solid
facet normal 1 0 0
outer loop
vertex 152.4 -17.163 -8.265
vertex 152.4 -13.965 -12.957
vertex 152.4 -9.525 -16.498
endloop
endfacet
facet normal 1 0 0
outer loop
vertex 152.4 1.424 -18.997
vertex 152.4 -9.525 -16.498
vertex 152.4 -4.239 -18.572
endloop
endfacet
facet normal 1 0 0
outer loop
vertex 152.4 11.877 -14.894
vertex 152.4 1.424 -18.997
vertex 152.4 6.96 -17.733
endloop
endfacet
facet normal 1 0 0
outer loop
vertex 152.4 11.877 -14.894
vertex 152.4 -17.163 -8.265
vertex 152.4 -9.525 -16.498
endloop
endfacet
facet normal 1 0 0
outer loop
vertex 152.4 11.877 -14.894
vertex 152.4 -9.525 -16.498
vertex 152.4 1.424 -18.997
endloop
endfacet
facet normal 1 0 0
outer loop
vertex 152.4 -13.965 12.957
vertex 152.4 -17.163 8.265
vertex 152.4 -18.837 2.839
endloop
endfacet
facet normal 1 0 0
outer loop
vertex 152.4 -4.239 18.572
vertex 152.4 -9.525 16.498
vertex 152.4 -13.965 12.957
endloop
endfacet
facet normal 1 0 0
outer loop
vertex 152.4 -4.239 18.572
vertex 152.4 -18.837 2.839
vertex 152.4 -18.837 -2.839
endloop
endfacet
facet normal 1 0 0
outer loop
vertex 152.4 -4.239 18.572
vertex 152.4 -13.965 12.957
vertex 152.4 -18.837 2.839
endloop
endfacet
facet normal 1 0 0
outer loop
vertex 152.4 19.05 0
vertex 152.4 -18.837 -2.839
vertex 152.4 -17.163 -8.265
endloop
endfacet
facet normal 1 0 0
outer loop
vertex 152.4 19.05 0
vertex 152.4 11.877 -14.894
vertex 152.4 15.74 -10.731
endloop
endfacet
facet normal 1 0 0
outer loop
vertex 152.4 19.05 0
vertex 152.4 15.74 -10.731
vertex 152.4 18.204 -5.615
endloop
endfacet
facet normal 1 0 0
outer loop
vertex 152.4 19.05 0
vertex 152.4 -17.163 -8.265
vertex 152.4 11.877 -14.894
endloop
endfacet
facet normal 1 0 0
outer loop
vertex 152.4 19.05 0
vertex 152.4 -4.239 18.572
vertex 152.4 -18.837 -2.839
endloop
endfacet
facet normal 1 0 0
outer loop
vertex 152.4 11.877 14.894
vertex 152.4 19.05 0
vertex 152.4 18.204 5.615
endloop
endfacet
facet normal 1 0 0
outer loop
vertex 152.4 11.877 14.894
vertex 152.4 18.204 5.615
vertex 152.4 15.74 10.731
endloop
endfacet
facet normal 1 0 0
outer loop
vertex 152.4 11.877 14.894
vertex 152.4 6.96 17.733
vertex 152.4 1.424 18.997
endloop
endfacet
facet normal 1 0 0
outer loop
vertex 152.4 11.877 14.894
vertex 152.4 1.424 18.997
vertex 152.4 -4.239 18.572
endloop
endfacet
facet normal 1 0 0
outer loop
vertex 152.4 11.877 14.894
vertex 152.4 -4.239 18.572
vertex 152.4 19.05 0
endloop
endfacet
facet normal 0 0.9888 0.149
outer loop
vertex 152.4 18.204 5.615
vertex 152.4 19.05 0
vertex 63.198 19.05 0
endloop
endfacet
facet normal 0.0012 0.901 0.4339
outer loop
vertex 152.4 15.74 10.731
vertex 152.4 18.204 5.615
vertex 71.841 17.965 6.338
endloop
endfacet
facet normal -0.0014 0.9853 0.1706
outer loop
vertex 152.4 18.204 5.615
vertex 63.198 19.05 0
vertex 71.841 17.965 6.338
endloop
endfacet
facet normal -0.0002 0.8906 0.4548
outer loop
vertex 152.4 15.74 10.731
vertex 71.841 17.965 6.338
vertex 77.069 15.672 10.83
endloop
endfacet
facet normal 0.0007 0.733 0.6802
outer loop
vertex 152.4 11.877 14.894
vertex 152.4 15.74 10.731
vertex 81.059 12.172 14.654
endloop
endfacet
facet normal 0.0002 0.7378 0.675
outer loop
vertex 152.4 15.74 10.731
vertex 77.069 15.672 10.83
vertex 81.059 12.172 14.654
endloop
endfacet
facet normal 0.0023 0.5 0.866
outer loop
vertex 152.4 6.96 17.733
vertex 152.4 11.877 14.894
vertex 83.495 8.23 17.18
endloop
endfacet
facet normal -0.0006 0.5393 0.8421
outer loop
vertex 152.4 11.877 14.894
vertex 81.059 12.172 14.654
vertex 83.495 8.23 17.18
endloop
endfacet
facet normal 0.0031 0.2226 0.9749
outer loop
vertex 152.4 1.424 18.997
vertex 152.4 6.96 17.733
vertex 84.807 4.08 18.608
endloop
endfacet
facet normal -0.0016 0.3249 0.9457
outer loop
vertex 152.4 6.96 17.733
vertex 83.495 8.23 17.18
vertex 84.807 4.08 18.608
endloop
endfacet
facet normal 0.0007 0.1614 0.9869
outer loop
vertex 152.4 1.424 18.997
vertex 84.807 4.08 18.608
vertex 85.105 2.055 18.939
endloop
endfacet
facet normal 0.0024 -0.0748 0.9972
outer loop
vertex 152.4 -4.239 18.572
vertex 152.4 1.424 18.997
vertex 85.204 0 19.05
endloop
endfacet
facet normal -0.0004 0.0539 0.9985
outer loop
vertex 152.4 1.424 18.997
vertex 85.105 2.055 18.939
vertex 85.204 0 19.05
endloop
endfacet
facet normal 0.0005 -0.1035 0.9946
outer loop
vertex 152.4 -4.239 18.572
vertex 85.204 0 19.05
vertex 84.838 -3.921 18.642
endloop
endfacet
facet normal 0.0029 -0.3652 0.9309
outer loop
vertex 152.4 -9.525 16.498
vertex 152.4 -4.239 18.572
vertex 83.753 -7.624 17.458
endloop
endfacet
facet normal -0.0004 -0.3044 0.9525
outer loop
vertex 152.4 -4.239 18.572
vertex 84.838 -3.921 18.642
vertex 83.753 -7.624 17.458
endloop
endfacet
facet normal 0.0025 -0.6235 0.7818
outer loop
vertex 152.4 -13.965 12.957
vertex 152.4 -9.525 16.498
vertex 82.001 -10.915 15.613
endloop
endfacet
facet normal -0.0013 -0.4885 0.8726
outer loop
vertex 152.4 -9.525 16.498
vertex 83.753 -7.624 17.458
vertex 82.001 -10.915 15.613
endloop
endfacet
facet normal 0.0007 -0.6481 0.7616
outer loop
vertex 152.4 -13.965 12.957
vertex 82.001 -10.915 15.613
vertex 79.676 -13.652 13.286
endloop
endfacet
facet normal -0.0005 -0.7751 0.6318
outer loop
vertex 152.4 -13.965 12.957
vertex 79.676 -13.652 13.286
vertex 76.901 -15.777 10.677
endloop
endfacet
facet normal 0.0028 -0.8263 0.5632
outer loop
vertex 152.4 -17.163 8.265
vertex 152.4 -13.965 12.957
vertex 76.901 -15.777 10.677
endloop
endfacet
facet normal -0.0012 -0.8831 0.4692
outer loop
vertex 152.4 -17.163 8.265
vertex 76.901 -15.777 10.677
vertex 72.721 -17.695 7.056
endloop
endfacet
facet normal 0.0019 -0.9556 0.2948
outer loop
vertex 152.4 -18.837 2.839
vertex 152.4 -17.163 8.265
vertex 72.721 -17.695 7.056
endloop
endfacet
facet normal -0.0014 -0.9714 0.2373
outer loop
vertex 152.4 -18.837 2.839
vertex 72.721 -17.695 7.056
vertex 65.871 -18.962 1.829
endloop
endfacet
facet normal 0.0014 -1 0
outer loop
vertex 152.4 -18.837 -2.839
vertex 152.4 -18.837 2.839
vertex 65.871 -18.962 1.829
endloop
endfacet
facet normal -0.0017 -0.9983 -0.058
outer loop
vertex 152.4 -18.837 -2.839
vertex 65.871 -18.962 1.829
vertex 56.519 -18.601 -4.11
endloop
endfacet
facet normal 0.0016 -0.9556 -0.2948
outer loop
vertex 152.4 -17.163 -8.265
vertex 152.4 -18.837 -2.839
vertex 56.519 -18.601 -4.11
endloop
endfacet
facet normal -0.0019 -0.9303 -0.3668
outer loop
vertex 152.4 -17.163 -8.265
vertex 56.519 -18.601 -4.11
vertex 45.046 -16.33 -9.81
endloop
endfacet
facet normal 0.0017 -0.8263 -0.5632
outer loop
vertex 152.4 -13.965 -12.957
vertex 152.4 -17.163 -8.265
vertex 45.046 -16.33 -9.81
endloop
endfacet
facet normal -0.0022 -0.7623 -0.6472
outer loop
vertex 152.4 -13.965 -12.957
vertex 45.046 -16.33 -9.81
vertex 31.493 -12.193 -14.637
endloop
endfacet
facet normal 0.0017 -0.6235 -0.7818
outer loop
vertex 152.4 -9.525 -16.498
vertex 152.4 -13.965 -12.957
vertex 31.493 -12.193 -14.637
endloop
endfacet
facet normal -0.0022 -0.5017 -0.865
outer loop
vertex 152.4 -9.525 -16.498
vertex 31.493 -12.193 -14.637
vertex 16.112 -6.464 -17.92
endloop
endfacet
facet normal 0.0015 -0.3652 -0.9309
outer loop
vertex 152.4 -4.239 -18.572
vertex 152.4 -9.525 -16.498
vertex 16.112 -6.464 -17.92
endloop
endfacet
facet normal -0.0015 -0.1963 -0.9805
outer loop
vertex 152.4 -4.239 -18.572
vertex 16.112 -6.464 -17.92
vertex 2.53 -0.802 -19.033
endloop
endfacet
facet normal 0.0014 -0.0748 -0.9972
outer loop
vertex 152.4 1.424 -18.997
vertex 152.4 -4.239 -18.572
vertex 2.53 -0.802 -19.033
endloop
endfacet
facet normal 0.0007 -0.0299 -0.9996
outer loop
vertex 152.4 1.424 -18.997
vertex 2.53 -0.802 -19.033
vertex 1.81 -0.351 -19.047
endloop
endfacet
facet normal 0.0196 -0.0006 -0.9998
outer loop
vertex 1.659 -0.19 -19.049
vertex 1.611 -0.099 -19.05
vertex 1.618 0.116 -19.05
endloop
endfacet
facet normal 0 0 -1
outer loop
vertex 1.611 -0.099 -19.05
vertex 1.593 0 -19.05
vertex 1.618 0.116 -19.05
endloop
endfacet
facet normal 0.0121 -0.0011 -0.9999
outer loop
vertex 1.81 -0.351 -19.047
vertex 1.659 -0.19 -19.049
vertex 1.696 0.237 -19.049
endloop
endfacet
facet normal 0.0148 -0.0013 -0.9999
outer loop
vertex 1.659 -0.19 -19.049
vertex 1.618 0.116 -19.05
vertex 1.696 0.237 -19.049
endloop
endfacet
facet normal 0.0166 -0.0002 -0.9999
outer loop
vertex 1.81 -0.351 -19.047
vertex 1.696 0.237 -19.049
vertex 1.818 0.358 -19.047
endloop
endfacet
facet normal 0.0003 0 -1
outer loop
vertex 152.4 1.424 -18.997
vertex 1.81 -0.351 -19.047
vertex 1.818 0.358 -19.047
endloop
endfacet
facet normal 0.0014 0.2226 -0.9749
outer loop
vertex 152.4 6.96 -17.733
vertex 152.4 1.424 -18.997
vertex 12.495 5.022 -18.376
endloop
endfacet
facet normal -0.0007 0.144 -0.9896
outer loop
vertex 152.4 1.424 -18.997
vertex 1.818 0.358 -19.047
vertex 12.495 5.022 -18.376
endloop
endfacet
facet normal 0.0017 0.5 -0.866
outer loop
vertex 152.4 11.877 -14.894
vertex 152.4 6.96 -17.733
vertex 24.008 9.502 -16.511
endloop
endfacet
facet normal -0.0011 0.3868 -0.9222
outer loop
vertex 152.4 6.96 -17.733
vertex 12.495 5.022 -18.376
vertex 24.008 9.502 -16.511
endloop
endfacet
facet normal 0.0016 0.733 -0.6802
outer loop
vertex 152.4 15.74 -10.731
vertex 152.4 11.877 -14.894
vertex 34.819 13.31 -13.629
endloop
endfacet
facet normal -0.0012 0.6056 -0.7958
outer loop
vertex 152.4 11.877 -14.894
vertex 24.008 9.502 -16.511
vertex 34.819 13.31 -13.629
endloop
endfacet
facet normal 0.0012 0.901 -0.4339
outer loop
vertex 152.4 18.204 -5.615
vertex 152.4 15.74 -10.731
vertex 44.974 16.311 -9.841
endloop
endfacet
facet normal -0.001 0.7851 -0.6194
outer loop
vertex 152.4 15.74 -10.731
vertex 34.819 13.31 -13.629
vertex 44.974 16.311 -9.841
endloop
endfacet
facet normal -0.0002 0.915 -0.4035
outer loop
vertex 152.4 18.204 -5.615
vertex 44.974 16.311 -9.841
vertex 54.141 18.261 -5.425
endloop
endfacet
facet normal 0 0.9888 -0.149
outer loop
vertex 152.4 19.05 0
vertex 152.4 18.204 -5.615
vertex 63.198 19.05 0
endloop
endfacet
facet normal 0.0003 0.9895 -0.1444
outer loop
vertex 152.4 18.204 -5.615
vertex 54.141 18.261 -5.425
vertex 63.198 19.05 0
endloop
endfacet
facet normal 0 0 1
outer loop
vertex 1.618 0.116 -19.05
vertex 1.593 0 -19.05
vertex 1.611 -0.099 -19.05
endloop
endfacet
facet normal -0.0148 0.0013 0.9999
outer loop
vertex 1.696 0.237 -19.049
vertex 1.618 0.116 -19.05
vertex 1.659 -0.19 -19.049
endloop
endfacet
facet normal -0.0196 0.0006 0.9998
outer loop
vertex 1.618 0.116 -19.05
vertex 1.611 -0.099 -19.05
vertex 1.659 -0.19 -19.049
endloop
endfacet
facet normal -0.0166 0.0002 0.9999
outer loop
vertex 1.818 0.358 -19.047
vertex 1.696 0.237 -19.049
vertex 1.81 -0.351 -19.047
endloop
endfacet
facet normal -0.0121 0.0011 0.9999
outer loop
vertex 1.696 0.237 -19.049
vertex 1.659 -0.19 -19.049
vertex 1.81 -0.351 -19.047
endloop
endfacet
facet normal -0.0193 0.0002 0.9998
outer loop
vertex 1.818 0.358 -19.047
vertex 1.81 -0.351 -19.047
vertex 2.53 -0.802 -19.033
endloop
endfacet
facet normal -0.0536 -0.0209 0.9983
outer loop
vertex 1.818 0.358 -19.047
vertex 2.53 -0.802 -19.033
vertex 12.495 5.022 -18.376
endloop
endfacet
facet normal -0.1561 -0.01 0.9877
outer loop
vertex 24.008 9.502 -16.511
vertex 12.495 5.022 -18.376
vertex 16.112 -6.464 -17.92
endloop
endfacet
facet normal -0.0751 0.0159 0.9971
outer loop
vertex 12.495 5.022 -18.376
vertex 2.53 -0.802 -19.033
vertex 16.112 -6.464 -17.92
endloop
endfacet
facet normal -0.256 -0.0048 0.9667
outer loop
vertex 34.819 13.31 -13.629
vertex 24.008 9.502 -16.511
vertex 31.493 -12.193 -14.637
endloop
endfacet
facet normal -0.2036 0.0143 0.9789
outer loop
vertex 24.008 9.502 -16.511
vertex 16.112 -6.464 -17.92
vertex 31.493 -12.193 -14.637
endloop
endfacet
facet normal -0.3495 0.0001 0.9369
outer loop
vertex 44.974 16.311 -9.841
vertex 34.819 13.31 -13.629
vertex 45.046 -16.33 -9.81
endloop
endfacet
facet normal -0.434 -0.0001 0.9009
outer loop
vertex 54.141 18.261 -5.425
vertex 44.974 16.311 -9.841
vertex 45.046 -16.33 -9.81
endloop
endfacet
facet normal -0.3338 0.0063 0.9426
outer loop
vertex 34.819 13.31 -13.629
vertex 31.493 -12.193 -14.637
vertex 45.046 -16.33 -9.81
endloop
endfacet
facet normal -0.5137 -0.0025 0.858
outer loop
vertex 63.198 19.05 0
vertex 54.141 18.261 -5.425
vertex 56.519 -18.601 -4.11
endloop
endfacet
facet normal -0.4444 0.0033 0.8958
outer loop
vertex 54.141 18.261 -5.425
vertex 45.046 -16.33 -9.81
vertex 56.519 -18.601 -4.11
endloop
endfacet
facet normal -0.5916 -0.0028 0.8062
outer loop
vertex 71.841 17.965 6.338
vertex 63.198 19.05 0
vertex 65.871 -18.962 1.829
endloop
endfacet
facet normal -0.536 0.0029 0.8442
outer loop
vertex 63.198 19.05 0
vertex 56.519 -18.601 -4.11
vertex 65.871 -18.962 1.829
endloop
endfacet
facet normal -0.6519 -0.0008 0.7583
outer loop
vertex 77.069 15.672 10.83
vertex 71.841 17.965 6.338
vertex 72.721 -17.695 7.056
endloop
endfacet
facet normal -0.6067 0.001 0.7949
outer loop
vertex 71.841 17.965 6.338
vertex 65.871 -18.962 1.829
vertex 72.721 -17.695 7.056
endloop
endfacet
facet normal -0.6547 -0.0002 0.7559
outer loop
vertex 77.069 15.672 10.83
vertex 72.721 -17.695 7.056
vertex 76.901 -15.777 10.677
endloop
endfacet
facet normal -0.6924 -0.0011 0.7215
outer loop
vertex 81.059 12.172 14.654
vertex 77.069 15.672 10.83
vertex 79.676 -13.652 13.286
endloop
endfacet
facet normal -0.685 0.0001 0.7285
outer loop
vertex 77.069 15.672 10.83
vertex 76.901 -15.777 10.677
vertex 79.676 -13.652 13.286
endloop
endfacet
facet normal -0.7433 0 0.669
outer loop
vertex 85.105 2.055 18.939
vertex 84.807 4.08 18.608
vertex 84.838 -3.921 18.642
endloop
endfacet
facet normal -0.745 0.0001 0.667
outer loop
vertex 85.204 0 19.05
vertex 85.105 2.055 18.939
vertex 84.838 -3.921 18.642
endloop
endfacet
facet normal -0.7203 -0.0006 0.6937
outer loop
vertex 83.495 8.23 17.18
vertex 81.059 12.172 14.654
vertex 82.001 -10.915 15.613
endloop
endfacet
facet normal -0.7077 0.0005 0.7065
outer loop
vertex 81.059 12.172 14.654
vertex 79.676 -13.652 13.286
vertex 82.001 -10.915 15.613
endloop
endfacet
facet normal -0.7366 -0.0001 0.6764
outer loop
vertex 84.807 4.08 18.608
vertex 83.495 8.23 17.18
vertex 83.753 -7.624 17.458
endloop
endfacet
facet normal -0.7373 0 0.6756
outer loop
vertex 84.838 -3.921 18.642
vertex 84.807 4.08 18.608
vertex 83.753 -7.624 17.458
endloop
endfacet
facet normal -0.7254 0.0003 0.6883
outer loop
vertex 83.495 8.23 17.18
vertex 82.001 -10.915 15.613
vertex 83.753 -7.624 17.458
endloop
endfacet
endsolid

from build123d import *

# Parameters (mm, degrees)
F0_R     = 19.05
F1_DEPTH = 152.4
F3_D     = 228.6
F3_DEPTH = 19.051
F4_D     = 228.6


with BuildPart() as f1:
    # F0 (on Right) → F1 (new body)
    with BuildSketch(Plane.YZ):
        Circle(F0_R)
    extrude(amount=F1_DEPTH)

    # F3 (through all, one way)
    with BuildSketch(Plane.XZ):
        with Locations((0, 95.2389016747)):
            Circle(F3_D / 2)
    extrude(amount=-F3_DEPTH, mode=Mode.SUBTRACT)

    # F4 (through all)
    with Locations(Plane(origin=(0, 0, 0), x_dir=(1, 0, 0), z_dir=(0, 1, 0))):
        with Locations((0, -95.2389016747)):
            Hole(F4_D / 2)


solid = f1.part
